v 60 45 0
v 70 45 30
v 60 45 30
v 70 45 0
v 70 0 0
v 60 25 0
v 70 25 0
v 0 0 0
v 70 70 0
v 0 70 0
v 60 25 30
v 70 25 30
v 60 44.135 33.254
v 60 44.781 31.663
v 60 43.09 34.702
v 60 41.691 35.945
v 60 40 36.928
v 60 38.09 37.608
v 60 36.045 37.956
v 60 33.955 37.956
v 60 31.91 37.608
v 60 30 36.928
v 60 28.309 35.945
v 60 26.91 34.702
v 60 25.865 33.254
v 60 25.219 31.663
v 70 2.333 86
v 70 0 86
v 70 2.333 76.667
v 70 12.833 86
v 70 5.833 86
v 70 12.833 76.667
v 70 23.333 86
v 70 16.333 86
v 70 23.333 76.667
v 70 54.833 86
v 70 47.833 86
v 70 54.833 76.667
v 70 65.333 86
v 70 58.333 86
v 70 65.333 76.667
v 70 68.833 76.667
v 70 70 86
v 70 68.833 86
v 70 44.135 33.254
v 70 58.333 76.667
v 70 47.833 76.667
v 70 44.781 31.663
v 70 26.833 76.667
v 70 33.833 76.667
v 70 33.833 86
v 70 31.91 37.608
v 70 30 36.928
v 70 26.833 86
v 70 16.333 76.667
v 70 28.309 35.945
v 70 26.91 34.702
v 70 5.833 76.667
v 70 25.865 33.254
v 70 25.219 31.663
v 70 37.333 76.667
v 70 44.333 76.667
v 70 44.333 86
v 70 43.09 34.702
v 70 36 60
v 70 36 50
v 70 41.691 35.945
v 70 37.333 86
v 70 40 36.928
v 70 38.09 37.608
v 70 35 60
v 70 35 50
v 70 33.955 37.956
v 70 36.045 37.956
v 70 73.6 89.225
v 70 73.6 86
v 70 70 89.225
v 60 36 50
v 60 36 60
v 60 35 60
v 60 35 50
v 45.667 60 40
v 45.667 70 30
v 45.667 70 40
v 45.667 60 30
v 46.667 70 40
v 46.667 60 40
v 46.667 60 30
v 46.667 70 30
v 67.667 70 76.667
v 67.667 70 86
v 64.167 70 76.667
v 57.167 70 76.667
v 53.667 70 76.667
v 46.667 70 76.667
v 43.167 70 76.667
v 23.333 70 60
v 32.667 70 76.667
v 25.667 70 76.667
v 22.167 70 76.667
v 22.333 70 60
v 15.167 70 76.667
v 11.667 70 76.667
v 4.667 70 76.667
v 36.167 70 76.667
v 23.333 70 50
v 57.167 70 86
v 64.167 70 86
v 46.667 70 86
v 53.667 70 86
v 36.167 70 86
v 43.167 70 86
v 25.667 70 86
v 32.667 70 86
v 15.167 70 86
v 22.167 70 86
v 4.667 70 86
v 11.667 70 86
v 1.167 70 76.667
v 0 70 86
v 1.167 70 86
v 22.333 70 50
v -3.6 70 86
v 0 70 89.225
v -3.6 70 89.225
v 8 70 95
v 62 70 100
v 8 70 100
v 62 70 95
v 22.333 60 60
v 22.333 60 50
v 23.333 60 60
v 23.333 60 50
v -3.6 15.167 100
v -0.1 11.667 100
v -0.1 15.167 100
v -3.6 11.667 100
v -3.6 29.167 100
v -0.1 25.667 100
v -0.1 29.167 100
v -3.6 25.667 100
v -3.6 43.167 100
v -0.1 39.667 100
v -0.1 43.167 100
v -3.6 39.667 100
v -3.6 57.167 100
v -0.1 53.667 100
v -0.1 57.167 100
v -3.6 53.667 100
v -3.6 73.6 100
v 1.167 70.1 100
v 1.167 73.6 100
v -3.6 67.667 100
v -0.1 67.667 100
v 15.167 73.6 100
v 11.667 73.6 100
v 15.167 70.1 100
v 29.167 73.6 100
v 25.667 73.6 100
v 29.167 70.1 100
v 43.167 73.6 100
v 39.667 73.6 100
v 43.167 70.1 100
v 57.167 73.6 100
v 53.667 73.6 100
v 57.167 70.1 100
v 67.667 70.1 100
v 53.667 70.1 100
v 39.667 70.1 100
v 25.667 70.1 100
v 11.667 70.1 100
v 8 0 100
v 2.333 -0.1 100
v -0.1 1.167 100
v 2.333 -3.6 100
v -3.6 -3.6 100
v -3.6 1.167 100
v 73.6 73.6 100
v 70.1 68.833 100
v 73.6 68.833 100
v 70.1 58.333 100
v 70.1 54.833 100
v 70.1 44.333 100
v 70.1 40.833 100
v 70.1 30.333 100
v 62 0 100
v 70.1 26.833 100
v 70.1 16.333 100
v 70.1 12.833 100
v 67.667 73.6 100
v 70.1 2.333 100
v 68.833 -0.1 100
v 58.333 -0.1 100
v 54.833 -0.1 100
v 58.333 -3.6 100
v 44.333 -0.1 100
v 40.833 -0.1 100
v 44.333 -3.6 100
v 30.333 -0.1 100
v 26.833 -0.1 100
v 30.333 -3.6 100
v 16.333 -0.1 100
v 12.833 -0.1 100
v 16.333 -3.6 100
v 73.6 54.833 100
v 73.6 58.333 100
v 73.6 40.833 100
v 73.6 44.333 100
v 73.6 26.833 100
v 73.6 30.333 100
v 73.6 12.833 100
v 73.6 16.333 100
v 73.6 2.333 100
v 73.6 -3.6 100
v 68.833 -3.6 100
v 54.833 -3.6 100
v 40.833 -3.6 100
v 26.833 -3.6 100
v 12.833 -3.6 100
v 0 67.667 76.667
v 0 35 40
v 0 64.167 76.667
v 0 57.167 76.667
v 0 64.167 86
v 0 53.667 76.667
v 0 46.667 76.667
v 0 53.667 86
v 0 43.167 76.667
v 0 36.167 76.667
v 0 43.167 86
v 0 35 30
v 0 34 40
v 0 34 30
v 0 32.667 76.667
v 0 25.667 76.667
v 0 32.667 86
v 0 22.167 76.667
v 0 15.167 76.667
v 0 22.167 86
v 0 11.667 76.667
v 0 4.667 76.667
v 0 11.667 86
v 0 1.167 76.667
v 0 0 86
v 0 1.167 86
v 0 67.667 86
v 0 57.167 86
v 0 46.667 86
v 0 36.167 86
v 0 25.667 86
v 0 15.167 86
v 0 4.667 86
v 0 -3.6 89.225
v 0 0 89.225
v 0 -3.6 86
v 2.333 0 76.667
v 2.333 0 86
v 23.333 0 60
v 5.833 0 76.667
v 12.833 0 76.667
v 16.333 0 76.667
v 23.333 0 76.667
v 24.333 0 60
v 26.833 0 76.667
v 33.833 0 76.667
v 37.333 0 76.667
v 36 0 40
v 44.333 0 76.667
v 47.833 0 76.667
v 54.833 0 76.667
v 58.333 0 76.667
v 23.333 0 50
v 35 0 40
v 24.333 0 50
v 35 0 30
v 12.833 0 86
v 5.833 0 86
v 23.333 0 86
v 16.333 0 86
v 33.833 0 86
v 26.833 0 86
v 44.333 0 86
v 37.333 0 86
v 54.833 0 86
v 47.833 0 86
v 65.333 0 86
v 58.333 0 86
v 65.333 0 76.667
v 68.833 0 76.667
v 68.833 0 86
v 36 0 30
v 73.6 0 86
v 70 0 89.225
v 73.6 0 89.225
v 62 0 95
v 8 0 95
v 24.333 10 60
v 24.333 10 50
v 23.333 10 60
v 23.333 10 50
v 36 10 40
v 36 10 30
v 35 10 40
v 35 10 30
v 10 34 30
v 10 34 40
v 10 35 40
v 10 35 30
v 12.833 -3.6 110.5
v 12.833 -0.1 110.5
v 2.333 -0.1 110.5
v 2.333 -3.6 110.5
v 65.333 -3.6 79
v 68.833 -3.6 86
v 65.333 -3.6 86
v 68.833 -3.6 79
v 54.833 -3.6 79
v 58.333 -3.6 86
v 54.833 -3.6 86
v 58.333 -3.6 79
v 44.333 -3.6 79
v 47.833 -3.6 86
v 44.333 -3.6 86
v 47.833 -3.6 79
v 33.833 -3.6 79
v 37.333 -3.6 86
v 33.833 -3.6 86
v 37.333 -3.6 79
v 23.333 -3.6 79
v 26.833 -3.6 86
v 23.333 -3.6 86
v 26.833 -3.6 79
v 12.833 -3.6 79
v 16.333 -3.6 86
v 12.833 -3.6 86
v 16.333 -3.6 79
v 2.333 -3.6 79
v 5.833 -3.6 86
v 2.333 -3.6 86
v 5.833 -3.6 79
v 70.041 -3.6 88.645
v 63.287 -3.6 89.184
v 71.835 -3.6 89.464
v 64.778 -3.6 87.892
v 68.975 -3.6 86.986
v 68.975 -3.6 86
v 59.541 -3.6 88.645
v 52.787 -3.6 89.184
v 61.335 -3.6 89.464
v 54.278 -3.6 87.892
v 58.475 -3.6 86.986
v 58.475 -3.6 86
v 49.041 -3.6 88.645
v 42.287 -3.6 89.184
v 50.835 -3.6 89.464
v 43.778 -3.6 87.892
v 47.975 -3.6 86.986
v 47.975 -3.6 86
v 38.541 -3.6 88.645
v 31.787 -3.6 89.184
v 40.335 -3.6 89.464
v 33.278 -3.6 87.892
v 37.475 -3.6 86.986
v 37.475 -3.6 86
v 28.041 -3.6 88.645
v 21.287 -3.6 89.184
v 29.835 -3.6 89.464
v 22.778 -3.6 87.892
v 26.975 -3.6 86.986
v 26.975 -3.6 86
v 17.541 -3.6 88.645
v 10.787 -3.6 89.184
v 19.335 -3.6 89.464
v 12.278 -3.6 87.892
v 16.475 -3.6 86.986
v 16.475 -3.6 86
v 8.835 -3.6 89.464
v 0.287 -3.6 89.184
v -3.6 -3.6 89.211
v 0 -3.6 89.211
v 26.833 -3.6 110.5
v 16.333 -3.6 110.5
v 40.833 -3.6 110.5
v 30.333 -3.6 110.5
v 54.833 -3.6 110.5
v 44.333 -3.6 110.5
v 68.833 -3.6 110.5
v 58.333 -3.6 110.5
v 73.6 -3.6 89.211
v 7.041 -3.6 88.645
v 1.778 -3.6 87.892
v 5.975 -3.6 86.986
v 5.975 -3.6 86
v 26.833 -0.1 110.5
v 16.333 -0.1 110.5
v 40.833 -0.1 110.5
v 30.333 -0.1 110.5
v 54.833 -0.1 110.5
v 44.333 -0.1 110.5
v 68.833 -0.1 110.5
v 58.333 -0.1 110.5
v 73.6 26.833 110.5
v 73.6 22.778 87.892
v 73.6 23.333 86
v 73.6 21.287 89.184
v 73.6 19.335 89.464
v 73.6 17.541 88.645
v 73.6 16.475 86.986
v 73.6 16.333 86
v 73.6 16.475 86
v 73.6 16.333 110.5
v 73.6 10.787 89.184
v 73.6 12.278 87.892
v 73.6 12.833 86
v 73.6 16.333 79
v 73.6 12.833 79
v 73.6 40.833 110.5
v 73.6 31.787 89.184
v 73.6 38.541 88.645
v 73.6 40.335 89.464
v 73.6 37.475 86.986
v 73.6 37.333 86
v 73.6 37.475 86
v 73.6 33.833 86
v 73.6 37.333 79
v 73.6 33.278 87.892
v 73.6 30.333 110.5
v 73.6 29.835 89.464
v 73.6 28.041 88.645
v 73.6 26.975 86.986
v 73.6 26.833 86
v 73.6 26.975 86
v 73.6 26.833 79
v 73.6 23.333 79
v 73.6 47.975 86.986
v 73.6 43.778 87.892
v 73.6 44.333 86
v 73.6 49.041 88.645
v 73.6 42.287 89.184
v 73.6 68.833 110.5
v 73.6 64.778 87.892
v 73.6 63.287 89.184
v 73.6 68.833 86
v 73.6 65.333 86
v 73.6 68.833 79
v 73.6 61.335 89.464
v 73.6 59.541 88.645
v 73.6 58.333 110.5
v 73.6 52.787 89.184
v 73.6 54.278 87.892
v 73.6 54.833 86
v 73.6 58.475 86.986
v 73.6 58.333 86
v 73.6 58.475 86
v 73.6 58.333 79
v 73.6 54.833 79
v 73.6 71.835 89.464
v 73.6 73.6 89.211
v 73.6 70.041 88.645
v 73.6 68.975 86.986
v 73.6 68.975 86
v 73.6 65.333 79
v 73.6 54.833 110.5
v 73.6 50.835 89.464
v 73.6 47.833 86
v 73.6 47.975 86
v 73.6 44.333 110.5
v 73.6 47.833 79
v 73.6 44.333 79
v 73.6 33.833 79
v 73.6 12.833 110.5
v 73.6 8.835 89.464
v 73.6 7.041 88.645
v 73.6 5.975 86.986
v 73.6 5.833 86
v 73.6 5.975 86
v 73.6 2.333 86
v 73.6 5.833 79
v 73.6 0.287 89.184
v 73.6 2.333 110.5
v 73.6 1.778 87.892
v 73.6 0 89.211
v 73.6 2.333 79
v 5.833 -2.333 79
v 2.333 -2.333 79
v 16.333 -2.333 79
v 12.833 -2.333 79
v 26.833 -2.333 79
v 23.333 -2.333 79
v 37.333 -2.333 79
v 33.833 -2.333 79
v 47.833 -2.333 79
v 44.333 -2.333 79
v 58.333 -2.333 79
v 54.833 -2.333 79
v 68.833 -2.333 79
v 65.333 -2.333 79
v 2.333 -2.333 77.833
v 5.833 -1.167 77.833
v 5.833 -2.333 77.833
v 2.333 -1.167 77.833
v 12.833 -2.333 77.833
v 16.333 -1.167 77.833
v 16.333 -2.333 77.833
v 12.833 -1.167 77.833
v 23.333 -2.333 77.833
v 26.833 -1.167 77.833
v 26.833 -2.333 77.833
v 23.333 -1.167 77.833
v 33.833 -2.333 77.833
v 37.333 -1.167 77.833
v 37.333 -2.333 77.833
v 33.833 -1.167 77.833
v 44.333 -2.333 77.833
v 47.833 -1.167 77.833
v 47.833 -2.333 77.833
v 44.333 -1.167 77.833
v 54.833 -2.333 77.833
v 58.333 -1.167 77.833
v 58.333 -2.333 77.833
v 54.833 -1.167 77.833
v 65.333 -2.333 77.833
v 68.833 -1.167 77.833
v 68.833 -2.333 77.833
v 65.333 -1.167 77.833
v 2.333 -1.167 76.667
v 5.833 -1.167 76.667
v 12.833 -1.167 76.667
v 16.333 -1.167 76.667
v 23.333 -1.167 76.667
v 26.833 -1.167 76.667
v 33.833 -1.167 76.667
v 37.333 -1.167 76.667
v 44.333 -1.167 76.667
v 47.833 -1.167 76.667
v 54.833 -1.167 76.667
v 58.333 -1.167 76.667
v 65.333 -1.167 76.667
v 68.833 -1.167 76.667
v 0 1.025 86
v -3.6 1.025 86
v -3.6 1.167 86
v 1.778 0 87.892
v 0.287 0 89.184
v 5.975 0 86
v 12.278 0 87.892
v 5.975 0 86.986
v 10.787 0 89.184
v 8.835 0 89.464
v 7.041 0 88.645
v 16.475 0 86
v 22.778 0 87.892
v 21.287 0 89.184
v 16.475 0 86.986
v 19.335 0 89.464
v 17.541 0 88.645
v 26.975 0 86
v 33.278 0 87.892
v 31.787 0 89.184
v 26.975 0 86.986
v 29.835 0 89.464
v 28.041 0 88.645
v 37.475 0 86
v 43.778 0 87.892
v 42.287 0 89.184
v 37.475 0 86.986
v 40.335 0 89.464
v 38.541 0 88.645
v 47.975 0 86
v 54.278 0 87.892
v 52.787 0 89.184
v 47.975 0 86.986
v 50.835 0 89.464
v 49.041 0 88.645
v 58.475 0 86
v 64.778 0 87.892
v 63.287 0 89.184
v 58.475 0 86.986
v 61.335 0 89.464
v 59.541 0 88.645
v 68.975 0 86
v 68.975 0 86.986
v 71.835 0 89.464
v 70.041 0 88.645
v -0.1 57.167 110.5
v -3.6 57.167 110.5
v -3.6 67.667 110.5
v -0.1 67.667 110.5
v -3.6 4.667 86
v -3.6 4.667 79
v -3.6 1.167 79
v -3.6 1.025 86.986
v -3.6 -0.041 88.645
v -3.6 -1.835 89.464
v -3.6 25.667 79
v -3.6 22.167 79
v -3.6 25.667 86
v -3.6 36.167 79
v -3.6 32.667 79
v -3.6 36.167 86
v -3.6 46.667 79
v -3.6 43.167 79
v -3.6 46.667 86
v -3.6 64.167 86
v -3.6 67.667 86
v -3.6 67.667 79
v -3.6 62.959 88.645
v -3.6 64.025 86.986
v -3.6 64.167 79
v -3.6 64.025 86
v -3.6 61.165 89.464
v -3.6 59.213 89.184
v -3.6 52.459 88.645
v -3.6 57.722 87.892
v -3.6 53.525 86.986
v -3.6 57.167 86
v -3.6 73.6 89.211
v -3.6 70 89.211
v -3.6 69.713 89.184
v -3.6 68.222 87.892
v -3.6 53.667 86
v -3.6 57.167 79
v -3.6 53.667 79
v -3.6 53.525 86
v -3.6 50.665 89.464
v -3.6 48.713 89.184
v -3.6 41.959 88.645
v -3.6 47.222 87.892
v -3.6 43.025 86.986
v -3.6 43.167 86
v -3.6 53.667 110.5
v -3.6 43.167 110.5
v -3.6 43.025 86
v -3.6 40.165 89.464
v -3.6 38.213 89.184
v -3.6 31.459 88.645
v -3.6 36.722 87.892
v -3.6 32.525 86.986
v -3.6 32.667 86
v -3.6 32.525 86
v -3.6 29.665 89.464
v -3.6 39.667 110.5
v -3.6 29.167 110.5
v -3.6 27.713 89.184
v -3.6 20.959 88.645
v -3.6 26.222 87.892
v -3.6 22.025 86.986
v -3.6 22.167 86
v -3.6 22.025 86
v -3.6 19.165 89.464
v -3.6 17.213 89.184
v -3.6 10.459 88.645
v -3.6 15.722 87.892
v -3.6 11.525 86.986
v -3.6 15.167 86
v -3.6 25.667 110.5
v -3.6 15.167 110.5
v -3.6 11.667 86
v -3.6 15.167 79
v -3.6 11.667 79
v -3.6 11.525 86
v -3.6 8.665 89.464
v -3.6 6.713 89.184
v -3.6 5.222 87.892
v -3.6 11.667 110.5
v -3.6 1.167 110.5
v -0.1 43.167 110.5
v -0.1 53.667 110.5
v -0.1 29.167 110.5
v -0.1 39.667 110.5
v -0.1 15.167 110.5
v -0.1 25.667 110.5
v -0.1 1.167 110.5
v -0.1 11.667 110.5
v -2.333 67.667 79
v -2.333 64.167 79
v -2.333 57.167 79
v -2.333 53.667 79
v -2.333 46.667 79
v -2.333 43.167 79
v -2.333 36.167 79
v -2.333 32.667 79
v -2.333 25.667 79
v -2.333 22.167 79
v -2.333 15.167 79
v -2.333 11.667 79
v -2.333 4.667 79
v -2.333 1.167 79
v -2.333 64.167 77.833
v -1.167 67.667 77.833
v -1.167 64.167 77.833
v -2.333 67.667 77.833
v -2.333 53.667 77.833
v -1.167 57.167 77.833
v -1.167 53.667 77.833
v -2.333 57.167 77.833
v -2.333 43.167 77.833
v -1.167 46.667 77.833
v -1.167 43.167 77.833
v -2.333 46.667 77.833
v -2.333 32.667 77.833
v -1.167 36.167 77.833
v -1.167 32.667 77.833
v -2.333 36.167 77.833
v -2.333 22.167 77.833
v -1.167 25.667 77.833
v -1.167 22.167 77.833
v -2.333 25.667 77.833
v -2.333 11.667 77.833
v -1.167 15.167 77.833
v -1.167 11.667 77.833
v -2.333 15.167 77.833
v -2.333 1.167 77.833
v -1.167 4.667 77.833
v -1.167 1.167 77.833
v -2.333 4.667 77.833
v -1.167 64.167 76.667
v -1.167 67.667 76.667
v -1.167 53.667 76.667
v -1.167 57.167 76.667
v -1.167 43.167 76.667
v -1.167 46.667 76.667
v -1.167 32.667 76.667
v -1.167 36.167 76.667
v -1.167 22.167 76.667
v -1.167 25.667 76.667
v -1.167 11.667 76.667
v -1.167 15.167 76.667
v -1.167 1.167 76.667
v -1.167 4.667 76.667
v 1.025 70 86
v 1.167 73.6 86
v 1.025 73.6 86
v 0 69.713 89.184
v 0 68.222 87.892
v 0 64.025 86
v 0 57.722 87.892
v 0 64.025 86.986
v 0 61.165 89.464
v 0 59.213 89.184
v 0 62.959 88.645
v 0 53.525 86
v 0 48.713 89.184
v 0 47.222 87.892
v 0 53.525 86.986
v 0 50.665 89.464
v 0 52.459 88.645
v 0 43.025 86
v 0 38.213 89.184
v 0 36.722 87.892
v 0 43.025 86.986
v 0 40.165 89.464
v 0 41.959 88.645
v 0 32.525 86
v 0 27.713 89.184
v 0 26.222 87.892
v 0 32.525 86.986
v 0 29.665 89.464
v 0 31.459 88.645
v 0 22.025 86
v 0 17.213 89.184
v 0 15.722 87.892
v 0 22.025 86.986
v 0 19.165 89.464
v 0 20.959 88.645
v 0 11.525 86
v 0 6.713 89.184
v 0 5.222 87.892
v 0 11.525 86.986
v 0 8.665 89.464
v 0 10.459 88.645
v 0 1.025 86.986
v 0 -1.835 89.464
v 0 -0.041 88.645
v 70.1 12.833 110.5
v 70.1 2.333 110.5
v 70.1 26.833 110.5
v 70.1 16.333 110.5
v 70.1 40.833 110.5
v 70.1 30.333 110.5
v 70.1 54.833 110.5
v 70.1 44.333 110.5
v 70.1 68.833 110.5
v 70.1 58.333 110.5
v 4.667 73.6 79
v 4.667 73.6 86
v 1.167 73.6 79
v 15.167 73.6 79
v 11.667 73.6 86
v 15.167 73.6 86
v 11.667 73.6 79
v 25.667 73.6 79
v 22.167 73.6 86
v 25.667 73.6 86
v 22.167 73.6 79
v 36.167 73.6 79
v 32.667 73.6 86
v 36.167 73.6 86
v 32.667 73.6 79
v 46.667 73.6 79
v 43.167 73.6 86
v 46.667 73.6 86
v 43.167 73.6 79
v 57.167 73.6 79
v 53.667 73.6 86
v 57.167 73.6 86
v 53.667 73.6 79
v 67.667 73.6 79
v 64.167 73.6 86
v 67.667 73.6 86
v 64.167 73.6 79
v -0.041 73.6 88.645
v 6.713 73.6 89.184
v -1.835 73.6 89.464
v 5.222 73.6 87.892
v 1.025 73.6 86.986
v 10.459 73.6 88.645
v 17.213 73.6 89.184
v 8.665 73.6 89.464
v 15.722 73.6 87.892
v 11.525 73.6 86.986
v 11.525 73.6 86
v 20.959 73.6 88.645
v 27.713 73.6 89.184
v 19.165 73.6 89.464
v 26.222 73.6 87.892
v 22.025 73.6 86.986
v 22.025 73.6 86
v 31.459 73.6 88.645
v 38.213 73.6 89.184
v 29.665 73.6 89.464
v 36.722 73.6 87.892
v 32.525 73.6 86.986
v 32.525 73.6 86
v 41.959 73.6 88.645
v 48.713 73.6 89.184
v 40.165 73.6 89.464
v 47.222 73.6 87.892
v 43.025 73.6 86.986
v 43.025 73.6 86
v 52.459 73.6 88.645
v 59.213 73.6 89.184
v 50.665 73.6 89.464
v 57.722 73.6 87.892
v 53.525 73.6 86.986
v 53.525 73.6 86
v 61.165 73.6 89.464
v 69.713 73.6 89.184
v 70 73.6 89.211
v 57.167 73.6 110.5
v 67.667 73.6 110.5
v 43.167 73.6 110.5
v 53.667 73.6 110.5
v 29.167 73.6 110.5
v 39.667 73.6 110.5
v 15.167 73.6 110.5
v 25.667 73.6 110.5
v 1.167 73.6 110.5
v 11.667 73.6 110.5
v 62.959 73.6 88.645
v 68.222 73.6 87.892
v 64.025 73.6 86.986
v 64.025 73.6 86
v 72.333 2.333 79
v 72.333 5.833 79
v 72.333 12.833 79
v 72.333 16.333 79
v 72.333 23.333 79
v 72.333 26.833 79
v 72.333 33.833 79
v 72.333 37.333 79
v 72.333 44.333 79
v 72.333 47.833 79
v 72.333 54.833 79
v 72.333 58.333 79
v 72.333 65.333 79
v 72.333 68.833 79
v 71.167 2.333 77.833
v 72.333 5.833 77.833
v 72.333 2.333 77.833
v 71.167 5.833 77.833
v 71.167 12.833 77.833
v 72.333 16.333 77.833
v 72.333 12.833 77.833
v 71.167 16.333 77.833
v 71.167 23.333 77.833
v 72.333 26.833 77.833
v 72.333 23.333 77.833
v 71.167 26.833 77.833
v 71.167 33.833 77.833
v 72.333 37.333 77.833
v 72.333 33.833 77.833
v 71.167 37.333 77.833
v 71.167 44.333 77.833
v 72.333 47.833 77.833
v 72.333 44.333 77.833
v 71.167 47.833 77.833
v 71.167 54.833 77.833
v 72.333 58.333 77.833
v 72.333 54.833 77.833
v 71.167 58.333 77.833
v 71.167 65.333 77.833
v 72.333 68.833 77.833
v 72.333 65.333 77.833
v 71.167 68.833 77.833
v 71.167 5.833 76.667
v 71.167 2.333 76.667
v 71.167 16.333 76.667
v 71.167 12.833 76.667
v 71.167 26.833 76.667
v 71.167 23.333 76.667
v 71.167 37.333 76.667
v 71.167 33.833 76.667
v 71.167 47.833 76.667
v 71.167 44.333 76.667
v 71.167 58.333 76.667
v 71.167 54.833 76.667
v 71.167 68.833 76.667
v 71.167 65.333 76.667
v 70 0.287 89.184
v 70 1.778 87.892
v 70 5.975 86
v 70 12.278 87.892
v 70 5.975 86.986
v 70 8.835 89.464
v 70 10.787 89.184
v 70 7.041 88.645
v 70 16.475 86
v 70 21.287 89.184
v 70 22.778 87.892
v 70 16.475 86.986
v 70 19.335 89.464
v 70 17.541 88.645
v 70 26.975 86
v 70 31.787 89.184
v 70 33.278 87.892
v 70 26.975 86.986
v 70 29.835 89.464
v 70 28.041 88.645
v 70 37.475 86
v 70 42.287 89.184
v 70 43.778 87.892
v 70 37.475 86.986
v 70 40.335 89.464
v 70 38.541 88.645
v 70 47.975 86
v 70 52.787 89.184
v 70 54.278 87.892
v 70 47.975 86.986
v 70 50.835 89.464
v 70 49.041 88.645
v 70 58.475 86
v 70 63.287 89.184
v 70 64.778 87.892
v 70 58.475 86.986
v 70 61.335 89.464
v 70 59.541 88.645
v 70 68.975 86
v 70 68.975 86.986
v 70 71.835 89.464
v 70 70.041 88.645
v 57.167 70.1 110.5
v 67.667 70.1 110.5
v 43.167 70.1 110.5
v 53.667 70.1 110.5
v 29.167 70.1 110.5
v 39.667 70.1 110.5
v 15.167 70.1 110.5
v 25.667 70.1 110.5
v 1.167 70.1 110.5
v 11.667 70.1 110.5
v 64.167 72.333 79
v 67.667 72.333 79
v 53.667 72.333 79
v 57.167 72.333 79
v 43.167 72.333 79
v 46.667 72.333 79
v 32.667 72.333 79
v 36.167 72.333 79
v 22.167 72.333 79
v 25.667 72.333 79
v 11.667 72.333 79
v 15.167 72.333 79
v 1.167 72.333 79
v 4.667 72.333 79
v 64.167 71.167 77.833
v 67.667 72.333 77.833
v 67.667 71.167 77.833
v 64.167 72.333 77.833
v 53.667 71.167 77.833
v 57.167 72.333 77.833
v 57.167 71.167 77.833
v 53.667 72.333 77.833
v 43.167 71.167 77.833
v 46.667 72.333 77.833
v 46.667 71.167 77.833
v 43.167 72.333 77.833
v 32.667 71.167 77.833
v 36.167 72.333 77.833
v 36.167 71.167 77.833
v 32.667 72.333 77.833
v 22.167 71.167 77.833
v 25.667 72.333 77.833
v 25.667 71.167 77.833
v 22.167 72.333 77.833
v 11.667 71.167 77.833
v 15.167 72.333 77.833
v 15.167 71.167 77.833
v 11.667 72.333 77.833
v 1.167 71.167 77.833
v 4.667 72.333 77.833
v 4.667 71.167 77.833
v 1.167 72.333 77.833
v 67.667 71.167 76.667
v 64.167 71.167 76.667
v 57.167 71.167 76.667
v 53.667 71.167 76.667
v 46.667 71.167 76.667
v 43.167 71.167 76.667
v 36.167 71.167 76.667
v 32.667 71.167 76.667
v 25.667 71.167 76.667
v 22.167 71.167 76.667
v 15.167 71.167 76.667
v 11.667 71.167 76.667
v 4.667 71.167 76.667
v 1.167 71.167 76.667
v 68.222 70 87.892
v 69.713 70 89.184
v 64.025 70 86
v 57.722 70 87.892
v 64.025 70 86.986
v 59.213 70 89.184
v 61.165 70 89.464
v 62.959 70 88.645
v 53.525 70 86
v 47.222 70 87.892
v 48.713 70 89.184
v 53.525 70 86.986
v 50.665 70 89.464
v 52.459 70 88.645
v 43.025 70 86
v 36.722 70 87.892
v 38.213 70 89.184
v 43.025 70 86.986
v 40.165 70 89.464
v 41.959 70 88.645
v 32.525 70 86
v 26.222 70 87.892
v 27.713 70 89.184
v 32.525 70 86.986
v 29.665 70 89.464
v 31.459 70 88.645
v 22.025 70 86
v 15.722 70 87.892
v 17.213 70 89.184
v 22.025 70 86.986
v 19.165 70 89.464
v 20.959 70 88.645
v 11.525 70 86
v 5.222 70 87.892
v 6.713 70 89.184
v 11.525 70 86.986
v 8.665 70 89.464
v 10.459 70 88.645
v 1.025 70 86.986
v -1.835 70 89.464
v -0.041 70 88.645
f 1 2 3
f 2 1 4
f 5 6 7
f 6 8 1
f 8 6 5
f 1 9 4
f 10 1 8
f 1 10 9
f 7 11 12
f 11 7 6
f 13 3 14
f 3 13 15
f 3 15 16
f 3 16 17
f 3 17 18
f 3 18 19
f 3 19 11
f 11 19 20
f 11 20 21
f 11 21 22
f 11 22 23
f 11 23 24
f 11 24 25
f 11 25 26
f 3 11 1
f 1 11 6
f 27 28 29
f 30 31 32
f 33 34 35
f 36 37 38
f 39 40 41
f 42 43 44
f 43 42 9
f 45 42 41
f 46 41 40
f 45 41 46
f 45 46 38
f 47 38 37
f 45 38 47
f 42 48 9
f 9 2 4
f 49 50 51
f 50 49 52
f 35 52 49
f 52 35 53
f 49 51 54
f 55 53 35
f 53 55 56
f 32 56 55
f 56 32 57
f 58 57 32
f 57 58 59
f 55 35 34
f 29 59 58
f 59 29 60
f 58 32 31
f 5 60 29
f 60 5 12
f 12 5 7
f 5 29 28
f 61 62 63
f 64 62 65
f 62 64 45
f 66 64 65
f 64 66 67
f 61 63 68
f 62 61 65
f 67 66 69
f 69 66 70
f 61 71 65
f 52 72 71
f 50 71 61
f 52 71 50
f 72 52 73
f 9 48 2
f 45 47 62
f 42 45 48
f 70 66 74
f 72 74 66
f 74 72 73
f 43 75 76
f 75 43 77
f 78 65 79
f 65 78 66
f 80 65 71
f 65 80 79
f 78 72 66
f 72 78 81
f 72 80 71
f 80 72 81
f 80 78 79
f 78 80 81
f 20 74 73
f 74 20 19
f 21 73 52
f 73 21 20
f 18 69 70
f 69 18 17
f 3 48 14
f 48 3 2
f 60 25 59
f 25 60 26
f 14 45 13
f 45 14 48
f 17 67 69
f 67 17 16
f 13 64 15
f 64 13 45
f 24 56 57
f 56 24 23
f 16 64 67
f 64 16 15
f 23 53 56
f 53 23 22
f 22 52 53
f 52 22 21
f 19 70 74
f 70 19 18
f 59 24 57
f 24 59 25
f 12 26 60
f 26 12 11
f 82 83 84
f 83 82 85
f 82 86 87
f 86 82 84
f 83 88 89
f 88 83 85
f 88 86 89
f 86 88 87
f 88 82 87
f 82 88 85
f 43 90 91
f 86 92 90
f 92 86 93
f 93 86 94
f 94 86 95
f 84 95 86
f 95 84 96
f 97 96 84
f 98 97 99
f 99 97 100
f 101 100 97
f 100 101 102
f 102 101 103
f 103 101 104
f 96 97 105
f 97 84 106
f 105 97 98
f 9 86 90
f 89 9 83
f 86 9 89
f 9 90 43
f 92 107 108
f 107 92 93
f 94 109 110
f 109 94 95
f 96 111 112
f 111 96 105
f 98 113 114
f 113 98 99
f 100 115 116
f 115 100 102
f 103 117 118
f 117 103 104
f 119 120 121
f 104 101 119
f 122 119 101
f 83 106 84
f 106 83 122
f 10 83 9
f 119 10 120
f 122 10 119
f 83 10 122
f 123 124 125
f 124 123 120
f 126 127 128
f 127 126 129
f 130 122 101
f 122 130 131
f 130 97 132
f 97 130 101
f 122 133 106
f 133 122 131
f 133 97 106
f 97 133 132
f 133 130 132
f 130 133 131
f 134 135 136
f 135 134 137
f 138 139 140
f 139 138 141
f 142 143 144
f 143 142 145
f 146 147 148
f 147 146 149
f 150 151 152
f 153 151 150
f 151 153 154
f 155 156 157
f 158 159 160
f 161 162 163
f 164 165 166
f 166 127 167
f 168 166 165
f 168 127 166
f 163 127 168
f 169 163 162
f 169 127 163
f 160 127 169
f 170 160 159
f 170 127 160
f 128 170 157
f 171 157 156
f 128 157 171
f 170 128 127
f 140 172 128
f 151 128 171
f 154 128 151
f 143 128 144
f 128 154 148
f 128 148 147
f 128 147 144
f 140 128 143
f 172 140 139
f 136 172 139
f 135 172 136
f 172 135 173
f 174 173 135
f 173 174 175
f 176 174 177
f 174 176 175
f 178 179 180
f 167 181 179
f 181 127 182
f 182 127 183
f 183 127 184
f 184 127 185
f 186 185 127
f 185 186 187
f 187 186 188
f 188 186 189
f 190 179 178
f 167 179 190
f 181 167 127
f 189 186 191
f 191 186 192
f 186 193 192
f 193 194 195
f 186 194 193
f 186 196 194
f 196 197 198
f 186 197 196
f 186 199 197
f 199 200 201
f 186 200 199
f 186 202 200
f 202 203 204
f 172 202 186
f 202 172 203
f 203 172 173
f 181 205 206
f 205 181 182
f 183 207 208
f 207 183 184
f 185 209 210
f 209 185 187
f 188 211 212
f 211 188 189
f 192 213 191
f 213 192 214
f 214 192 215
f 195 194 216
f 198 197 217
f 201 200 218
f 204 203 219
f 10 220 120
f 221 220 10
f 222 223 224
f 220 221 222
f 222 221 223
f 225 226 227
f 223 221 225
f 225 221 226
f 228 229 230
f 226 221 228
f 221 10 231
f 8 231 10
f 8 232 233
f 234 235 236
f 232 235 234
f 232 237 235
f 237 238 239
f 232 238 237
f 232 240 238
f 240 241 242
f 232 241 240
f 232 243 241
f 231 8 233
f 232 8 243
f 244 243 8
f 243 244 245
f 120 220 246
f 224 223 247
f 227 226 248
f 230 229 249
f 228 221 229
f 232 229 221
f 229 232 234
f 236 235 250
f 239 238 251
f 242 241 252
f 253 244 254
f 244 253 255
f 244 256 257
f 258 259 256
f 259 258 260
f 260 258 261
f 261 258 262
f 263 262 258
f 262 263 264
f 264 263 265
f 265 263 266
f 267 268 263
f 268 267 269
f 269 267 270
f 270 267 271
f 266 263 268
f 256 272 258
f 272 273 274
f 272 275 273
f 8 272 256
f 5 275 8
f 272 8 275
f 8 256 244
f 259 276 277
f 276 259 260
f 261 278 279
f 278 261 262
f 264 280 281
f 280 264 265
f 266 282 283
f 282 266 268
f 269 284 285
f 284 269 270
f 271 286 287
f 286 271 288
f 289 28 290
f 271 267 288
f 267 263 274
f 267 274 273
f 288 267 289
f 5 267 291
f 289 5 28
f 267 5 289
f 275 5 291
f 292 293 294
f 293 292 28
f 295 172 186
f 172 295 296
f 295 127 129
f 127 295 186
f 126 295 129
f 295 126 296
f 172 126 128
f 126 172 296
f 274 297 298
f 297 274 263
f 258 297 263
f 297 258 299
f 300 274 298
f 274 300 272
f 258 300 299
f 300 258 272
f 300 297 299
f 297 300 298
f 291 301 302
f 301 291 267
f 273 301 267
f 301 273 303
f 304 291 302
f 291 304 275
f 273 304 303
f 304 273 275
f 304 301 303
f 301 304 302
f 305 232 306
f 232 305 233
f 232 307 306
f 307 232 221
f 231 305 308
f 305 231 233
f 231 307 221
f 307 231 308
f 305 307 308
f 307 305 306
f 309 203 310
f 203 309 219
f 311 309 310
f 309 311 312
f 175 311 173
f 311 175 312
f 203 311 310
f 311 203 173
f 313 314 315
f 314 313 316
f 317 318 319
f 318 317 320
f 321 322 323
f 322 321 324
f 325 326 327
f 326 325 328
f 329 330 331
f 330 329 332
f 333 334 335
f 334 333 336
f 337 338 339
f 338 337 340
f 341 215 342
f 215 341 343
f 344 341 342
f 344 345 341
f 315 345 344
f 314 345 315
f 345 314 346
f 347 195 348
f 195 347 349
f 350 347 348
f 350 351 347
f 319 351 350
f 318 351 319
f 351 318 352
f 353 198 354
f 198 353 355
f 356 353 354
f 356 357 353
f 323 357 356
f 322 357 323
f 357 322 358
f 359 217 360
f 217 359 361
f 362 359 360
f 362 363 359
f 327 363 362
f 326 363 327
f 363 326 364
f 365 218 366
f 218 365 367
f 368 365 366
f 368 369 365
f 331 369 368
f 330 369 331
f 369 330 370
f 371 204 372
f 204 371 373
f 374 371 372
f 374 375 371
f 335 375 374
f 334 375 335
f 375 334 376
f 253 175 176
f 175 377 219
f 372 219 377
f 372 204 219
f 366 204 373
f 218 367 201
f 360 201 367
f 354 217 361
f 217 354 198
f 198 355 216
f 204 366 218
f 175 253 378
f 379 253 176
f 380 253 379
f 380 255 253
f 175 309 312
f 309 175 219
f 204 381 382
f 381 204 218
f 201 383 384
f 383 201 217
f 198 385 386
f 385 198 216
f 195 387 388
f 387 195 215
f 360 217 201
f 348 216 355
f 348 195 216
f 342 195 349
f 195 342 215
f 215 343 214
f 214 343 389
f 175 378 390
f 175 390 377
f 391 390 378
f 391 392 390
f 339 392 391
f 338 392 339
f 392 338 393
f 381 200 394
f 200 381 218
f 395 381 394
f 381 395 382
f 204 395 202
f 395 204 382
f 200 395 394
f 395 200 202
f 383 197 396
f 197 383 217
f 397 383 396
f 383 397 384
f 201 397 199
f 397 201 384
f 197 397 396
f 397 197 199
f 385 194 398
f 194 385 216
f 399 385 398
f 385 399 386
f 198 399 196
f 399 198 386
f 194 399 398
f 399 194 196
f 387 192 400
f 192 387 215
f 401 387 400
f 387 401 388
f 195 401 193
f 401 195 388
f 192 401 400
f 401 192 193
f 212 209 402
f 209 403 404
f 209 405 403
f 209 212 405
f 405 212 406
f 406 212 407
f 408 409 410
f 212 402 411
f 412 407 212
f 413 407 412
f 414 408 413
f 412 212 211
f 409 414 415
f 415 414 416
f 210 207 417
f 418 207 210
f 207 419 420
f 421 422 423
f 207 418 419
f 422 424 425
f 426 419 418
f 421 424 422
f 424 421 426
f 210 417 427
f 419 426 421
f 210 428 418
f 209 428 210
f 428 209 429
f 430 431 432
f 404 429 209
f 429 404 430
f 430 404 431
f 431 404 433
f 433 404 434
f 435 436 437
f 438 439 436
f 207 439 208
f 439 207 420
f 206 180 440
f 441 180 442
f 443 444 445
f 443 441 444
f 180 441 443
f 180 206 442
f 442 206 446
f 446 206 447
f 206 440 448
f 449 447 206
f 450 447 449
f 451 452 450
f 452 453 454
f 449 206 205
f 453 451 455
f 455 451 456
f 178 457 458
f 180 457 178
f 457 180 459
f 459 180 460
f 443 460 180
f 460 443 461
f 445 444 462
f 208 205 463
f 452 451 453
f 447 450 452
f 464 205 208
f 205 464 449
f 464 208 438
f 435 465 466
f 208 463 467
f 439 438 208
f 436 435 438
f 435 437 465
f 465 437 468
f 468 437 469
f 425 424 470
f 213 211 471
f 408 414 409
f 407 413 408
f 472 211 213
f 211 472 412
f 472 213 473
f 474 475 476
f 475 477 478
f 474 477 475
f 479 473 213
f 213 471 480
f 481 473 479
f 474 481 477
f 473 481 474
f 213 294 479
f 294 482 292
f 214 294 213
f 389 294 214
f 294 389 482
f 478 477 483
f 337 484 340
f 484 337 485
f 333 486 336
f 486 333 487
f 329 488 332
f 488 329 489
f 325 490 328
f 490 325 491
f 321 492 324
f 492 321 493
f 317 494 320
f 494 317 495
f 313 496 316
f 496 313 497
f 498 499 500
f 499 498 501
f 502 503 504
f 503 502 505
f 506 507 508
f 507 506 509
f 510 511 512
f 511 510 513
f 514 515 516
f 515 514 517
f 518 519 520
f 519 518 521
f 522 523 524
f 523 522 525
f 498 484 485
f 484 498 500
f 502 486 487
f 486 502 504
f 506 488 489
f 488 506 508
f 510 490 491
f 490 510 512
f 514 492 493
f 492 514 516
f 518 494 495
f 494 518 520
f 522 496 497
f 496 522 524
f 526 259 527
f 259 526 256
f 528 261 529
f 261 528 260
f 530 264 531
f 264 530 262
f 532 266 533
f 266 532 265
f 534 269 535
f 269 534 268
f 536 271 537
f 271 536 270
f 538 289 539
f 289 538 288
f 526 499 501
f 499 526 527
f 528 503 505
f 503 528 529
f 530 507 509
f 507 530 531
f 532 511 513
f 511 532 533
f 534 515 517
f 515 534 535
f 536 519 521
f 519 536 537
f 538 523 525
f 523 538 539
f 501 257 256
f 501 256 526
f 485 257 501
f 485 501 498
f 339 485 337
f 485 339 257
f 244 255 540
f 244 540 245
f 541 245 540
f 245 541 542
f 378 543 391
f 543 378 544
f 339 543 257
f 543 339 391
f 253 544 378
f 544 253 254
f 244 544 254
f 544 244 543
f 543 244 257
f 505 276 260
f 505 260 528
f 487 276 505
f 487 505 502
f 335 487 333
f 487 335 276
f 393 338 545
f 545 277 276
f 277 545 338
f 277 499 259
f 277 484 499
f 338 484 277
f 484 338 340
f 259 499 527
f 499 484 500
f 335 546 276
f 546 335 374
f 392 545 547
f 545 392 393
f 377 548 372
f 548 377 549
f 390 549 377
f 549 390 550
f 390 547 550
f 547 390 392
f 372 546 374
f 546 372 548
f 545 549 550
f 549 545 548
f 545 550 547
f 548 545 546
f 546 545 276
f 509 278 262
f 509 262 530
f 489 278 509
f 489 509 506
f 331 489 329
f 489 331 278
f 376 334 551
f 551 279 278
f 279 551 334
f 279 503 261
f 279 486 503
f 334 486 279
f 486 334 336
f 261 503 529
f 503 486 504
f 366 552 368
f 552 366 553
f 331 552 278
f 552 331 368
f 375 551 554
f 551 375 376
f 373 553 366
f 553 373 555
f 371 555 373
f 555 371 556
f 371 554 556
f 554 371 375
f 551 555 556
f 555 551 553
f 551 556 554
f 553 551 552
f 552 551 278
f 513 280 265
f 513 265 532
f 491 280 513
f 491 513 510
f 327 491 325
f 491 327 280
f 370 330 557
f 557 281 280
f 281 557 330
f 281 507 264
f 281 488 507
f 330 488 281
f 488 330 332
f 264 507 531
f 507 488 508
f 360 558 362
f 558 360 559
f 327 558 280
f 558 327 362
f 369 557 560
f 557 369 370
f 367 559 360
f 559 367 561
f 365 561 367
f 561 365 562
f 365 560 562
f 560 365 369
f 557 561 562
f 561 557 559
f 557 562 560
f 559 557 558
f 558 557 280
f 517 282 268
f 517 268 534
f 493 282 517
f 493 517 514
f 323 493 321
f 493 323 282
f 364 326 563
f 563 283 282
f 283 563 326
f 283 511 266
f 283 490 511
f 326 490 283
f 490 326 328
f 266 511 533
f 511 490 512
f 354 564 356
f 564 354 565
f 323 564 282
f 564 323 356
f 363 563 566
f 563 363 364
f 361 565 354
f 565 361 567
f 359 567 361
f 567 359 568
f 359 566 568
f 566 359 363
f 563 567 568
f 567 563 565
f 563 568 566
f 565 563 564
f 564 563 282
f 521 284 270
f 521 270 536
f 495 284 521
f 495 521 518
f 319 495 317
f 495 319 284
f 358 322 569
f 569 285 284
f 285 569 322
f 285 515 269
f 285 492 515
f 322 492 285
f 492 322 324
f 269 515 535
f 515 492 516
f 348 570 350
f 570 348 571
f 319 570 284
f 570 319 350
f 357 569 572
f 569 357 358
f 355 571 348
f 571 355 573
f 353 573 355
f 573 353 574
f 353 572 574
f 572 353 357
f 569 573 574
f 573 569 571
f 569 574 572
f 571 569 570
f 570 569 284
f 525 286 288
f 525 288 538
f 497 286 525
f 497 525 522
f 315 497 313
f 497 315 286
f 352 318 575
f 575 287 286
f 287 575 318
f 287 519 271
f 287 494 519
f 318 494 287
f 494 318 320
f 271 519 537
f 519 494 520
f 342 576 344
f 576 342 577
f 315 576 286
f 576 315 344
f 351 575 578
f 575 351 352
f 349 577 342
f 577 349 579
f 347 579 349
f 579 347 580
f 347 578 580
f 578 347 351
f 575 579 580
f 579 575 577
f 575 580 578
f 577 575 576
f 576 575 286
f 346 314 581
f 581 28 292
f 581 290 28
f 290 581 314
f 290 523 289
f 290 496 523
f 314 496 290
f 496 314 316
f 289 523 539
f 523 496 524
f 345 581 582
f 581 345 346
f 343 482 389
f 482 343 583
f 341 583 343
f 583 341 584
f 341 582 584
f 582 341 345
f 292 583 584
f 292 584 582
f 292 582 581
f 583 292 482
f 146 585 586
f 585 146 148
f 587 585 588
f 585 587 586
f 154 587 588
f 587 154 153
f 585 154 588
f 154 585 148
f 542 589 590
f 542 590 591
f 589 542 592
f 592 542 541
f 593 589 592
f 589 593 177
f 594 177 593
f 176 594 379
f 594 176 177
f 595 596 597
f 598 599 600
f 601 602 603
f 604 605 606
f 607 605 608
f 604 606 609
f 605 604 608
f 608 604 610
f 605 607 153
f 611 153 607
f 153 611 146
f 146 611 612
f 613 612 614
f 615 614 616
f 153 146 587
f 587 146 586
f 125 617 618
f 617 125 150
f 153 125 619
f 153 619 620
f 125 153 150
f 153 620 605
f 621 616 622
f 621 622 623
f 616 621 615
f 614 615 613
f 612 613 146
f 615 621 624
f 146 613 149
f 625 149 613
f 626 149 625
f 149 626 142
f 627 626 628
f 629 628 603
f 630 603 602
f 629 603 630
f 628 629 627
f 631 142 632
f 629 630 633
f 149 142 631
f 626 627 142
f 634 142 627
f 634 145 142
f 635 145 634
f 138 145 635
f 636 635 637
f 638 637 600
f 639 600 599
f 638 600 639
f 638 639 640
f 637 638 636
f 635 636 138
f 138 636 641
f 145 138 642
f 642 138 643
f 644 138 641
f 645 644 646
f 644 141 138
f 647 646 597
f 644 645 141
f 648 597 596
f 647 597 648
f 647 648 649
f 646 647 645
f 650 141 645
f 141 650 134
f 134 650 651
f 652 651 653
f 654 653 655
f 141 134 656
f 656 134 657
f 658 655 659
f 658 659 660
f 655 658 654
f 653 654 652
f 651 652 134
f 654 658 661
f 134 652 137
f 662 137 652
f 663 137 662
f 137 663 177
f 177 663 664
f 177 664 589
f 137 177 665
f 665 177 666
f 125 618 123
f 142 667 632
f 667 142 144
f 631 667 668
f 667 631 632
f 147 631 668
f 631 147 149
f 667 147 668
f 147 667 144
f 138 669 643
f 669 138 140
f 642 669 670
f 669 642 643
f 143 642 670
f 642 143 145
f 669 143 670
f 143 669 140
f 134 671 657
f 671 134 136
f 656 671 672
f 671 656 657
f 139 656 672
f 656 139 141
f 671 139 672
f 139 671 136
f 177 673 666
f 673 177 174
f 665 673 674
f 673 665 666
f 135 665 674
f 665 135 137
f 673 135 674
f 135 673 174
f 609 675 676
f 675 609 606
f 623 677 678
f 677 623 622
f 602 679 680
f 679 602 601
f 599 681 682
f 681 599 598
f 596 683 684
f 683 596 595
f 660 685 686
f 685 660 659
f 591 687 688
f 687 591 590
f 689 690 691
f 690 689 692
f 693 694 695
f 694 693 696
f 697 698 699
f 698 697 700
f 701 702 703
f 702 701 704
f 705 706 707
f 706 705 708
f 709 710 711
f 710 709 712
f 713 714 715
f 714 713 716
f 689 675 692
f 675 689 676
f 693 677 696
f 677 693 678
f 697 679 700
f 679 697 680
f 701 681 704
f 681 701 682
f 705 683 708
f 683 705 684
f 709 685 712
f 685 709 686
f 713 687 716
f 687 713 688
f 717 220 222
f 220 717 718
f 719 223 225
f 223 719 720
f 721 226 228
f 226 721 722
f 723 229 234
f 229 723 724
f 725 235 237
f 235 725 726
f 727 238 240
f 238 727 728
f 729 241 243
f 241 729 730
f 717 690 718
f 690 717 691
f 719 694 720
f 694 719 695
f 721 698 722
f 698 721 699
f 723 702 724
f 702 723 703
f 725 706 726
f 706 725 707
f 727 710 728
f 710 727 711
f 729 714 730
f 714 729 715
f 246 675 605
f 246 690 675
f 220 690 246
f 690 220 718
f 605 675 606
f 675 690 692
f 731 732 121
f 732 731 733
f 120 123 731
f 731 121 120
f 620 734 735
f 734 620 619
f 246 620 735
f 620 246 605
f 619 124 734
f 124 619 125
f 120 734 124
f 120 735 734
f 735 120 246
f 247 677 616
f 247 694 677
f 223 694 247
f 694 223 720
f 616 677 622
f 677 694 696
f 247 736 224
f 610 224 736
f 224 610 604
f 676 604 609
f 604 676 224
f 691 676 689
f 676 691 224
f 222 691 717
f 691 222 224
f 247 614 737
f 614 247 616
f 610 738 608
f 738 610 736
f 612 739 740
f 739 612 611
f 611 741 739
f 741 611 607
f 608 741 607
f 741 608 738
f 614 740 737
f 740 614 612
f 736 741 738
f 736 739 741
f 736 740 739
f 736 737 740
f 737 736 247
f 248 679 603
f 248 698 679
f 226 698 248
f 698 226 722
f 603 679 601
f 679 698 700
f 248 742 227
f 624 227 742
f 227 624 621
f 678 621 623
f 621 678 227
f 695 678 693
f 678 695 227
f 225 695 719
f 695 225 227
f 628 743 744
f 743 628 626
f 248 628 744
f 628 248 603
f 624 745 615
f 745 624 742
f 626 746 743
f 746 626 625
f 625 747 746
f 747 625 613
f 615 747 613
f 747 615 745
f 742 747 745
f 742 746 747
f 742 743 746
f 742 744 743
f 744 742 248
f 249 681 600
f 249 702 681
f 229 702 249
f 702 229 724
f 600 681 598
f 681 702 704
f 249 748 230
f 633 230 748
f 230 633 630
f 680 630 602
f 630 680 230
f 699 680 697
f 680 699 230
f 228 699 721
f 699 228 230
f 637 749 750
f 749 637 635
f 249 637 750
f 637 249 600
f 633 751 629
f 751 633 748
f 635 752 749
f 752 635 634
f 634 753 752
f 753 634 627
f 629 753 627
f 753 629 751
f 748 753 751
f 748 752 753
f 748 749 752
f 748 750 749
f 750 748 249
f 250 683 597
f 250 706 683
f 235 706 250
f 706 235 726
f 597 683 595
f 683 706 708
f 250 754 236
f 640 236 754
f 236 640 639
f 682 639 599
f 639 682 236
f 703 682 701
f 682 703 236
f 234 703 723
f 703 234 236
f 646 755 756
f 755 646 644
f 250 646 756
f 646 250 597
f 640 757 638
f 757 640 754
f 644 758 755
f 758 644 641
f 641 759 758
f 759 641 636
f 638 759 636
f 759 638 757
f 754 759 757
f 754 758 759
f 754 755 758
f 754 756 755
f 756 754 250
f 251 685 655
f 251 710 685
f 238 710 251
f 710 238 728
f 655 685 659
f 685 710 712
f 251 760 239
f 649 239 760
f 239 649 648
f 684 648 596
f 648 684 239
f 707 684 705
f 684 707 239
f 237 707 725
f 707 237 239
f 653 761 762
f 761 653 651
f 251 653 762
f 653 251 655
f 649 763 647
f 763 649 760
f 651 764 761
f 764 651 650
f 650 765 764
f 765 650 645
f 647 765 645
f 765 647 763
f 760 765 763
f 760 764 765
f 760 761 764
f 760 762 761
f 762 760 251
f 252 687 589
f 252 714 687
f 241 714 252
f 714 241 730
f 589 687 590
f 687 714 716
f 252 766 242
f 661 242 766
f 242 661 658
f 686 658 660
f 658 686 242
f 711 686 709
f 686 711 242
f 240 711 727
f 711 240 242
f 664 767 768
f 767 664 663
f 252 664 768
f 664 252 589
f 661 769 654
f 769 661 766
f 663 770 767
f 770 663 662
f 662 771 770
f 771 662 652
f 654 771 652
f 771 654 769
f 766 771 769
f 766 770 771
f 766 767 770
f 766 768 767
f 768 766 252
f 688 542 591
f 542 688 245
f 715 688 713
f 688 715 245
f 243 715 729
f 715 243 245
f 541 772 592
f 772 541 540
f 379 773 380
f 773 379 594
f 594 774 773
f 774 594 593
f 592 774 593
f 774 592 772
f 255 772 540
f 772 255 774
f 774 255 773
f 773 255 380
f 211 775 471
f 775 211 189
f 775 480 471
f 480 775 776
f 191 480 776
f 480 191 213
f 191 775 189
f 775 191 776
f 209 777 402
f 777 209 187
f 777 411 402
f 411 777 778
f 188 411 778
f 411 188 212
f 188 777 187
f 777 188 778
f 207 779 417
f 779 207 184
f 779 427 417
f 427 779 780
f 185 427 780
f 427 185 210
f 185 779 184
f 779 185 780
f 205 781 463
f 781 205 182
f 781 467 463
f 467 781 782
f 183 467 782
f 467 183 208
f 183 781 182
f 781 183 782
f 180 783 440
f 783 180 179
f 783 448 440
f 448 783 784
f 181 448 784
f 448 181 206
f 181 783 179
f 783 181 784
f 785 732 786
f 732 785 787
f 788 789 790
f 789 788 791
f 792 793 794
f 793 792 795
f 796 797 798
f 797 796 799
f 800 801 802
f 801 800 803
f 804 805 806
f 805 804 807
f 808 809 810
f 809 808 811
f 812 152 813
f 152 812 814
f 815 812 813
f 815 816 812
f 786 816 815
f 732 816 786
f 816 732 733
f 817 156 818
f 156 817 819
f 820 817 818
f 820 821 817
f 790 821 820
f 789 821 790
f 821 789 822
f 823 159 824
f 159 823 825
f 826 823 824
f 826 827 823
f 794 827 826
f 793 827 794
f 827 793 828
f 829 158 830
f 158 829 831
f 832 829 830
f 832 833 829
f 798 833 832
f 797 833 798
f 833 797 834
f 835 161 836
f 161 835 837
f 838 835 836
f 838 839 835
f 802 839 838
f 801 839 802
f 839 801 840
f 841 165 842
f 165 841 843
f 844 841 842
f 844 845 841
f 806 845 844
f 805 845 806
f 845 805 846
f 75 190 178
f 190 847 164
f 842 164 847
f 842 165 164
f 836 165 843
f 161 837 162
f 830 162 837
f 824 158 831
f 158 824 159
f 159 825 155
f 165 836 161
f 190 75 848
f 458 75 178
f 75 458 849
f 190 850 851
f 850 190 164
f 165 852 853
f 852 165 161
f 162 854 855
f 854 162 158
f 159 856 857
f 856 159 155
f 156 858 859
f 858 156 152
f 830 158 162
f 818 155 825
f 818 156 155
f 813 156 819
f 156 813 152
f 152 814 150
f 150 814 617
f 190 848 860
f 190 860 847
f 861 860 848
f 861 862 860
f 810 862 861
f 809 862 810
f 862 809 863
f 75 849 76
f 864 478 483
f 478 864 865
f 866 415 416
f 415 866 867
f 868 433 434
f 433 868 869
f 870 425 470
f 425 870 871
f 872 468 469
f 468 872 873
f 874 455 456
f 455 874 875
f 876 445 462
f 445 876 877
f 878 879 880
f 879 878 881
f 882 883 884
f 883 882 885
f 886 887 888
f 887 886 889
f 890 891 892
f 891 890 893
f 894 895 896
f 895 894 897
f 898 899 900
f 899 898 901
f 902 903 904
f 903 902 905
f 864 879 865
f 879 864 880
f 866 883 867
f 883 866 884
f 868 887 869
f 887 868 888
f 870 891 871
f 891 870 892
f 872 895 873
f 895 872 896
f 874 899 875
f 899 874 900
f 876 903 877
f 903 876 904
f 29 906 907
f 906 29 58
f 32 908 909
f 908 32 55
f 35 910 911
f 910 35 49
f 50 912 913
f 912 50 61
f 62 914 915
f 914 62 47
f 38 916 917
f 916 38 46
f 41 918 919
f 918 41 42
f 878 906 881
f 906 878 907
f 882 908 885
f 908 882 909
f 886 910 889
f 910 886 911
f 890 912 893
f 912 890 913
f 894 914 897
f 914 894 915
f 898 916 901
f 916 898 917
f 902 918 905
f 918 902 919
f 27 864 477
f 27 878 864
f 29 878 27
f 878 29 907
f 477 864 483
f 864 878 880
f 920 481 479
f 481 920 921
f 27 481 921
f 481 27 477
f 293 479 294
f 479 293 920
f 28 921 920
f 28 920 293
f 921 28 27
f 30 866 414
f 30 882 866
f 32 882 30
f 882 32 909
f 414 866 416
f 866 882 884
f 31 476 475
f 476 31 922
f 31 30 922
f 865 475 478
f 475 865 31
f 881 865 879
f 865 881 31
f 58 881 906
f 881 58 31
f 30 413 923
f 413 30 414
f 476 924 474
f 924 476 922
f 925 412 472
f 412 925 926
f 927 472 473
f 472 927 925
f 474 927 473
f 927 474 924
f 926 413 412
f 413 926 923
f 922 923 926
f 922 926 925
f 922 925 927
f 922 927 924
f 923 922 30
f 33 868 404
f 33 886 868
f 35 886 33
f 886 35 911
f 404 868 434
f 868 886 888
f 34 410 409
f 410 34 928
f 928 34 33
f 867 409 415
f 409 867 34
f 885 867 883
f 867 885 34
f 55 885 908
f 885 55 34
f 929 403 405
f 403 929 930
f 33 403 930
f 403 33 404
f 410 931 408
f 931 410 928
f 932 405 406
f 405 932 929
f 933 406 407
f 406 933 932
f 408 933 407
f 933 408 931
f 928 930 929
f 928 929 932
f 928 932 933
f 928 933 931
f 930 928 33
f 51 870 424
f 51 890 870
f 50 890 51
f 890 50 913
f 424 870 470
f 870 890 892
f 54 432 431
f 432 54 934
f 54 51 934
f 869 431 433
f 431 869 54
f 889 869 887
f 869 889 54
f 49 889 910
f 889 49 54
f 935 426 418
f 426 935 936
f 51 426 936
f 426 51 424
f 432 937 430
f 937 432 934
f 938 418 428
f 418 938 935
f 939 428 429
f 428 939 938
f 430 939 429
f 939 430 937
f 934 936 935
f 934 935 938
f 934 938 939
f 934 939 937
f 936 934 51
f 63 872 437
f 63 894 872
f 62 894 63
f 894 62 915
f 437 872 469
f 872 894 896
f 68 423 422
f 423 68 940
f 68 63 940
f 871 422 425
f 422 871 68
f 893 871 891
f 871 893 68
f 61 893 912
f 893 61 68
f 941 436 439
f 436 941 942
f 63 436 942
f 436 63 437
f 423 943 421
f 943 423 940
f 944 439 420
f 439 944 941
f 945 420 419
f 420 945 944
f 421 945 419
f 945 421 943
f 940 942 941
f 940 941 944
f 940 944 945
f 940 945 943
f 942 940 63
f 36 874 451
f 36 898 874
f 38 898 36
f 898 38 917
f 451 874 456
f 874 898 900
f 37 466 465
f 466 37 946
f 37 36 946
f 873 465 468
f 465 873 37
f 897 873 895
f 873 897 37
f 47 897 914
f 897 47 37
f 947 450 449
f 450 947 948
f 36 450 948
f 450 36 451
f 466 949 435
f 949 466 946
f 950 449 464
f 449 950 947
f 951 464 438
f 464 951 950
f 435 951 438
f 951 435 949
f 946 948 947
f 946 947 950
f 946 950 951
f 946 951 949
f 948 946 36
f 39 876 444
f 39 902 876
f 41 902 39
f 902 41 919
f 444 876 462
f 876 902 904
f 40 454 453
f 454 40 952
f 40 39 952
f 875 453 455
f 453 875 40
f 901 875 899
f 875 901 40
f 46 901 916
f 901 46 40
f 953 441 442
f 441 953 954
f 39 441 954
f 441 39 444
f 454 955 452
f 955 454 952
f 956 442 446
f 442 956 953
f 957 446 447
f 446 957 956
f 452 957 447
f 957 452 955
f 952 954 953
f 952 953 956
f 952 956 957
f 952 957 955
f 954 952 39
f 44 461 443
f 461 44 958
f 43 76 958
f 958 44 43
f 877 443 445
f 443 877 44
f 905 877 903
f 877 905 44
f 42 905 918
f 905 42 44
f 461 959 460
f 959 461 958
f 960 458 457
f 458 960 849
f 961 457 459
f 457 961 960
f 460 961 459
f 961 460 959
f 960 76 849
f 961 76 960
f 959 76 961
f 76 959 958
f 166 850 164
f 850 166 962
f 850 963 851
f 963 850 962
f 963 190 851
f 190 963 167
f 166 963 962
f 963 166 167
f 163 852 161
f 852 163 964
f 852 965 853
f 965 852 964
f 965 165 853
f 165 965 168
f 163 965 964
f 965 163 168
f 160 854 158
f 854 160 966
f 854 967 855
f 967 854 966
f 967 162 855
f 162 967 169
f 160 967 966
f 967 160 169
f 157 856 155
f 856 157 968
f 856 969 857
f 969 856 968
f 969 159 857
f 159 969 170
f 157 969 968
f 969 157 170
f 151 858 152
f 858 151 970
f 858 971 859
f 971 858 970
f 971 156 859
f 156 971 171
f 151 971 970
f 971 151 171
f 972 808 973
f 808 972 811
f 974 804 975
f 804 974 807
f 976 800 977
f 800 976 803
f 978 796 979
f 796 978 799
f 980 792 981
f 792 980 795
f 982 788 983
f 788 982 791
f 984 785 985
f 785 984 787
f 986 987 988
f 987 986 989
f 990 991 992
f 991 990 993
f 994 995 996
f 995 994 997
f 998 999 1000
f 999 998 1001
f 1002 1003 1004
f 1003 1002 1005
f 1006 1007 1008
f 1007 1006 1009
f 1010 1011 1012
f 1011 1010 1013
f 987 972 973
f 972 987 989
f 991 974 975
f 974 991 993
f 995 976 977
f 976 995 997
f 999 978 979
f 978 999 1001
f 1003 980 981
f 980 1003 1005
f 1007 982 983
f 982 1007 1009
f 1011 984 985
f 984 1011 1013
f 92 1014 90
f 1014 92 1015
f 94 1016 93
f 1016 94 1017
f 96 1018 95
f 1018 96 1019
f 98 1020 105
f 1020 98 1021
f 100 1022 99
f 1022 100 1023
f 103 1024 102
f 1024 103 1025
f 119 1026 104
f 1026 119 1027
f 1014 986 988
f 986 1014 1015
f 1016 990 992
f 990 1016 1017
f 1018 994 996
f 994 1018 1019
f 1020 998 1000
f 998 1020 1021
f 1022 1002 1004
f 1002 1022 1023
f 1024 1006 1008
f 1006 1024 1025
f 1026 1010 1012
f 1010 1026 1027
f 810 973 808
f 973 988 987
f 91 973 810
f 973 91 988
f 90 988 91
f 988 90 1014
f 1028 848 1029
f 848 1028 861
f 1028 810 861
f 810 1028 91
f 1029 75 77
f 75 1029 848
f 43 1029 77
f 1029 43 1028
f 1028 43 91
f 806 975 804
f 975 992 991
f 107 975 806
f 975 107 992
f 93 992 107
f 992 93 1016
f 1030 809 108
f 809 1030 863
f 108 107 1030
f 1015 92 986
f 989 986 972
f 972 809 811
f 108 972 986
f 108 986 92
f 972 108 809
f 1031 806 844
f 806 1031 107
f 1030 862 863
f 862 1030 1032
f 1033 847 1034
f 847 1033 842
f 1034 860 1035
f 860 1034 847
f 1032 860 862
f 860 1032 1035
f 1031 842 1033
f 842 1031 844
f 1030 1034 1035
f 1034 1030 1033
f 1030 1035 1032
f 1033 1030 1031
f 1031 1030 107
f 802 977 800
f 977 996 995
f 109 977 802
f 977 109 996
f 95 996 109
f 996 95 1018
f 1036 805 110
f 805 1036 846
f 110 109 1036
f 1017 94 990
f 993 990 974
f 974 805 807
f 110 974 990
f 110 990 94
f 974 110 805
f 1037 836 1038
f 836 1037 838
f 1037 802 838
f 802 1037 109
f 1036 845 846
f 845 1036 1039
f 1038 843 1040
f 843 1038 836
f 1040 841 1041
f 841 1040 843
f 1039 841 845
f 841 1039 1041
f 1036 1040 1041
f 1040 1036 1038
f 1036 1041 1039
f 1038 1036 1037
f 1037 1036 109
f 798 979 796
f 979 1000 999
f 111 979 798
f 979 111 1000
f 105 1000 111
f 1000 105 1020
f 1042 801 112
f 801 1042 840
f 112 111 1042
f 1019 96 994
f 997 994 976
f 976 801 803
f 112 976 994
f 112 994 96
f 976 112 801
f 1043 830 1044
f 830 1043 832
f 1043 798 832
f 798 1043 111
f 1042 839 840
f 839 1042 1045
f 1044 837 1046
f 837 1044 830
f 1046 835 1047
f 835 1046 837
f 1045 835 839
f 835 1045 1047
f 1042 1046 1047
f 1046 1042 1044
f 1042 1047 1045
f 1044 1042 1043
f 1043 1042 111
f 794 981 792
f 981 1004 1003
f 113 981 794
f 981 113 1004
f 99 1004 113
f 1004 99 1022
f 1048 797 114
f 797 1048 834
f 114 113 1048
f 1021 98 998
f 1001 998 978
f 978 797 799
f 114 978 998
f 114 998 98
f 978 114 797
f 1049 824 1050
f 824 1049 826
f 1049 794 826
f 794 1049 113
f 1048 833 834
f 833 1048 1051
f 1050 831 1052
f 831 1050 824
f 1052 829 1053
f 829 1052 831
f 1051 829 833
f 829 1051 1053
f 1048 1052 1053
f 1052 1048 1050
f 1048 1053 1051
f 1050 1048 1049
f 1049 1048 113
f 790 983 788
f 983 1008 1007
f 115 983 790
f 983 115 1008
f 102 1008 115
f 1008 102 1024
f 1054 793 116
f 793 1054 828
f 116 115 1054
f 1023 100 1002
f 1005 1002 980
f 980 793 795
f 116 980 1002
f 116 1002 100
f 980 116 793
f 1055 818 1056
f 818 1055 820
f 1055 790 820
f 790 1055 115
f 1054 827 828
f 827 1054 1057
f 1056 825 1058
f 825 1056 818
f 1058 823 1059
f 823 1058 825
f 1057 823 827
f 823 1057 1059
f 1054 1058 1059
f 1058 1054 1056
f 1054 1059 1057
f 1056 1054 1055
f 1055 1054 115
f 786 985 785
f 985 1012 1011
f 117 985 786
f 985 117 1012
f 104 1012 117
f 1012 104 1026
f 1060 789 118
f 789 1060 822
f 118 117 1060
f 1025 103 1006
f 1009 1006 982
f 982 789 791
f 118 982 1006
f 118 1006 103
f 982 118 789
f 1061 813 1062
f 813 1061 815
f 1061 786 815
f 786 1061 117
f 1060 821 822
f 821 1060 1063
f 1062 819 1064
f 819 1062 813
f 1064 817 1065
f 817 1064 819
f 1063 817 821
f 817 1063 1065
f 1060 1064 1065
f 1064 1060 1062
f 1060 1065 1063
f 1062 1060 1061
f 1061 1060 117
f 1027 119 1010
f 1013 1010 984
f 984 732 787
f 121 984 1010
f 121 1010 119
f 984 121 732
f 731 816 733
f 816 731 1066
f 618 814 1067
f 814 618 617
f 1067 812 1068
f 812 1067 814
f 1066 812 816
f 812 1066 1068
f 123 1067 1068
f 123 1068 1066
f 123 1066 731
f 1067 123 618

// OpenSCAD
difference(){
    cube([70,70,100]);
    translate([(70-54)/2,0,100-5]) cube([54, 70, 11]);
    translate([70/3,0,50])cube([1,10,10]);
    translate([70/2,0,30])cube([1,10,10]);
    
    translate([0,70,0])
    rotate([0,0,-90])
    translate([70/2,0,30])cube([1,10,10]);
    
    translate([70,0,0])
    rotate([0,0,90])
    translate([70/2-10,0,0]){
        cube([20,10,30]);
        translate([10,0,50])cube([1,10,10]);
        #translate([10,0,30])scale([1,1,0.8])rotate([-90,0,0])cylinder(10,d=20);
    }
    
    translate([70,70,0])
    rotate([0,0,180]) {
        translate([70/3,0,30])cube([1,10,10]);
        translate([70/3*2,0,50])cube([1,10,10]);
    }
}

battlement_size = 7;

battlement();

translate([0,70,0])
rotate([0,0,-90])
battlement();

translate([70,0,0])
rotate([0,0,90])
battlement();

translate([70,70,0])
rotate([0,0,180])
battlement();


module battlement(){
    for (i = [0:battlement_size*2:70-battlement_size]) {
        translate([i+battlement_size/3, -battlement_size/2-0.1, 100-battlement_size])
        cube([battlement_size*3/2, battlement_size/2, battlement_size*2.5]);
    }


    
    difference(){
    union(){
    translate([0,-battlement_size/2-0.1,100-battlement_size*3])
    cube([70+battlement_size/2+0.1, battlement_size/2+0.1,battlement_size*3]);
    
    translate([0,-battlement_size/(2*3/2),100-battlement_size*(3+1/6)])
    cube([70+battlement_size/(2*3/2), battlement_size/2*3/2,battlement_size/2]);

    translate([0,-battlement_size/2/3,100-battlement_size*(3+2/6)])
    cube([70+battlement_size/2/3, battlement_size/2/3,battlement_size/2]);
        
    }
        for (j = [0:battlement_size*1.5:70+battlement_size]) {
            translate([j-battlement_size/1.5,-battlement_size/2-0.2,100-battlement_size*4]){
                cube([battlement_size,battlement_size,battlement_size*2]);
                
                translate([battlement_size/2,battlement_size/2+0.2,battlement_size*2])
                rotate([90,0,0])
                cylinder(battlement_size/2+0.2,d=battlement_size);
            }
        }
    }
    
    
    
}
